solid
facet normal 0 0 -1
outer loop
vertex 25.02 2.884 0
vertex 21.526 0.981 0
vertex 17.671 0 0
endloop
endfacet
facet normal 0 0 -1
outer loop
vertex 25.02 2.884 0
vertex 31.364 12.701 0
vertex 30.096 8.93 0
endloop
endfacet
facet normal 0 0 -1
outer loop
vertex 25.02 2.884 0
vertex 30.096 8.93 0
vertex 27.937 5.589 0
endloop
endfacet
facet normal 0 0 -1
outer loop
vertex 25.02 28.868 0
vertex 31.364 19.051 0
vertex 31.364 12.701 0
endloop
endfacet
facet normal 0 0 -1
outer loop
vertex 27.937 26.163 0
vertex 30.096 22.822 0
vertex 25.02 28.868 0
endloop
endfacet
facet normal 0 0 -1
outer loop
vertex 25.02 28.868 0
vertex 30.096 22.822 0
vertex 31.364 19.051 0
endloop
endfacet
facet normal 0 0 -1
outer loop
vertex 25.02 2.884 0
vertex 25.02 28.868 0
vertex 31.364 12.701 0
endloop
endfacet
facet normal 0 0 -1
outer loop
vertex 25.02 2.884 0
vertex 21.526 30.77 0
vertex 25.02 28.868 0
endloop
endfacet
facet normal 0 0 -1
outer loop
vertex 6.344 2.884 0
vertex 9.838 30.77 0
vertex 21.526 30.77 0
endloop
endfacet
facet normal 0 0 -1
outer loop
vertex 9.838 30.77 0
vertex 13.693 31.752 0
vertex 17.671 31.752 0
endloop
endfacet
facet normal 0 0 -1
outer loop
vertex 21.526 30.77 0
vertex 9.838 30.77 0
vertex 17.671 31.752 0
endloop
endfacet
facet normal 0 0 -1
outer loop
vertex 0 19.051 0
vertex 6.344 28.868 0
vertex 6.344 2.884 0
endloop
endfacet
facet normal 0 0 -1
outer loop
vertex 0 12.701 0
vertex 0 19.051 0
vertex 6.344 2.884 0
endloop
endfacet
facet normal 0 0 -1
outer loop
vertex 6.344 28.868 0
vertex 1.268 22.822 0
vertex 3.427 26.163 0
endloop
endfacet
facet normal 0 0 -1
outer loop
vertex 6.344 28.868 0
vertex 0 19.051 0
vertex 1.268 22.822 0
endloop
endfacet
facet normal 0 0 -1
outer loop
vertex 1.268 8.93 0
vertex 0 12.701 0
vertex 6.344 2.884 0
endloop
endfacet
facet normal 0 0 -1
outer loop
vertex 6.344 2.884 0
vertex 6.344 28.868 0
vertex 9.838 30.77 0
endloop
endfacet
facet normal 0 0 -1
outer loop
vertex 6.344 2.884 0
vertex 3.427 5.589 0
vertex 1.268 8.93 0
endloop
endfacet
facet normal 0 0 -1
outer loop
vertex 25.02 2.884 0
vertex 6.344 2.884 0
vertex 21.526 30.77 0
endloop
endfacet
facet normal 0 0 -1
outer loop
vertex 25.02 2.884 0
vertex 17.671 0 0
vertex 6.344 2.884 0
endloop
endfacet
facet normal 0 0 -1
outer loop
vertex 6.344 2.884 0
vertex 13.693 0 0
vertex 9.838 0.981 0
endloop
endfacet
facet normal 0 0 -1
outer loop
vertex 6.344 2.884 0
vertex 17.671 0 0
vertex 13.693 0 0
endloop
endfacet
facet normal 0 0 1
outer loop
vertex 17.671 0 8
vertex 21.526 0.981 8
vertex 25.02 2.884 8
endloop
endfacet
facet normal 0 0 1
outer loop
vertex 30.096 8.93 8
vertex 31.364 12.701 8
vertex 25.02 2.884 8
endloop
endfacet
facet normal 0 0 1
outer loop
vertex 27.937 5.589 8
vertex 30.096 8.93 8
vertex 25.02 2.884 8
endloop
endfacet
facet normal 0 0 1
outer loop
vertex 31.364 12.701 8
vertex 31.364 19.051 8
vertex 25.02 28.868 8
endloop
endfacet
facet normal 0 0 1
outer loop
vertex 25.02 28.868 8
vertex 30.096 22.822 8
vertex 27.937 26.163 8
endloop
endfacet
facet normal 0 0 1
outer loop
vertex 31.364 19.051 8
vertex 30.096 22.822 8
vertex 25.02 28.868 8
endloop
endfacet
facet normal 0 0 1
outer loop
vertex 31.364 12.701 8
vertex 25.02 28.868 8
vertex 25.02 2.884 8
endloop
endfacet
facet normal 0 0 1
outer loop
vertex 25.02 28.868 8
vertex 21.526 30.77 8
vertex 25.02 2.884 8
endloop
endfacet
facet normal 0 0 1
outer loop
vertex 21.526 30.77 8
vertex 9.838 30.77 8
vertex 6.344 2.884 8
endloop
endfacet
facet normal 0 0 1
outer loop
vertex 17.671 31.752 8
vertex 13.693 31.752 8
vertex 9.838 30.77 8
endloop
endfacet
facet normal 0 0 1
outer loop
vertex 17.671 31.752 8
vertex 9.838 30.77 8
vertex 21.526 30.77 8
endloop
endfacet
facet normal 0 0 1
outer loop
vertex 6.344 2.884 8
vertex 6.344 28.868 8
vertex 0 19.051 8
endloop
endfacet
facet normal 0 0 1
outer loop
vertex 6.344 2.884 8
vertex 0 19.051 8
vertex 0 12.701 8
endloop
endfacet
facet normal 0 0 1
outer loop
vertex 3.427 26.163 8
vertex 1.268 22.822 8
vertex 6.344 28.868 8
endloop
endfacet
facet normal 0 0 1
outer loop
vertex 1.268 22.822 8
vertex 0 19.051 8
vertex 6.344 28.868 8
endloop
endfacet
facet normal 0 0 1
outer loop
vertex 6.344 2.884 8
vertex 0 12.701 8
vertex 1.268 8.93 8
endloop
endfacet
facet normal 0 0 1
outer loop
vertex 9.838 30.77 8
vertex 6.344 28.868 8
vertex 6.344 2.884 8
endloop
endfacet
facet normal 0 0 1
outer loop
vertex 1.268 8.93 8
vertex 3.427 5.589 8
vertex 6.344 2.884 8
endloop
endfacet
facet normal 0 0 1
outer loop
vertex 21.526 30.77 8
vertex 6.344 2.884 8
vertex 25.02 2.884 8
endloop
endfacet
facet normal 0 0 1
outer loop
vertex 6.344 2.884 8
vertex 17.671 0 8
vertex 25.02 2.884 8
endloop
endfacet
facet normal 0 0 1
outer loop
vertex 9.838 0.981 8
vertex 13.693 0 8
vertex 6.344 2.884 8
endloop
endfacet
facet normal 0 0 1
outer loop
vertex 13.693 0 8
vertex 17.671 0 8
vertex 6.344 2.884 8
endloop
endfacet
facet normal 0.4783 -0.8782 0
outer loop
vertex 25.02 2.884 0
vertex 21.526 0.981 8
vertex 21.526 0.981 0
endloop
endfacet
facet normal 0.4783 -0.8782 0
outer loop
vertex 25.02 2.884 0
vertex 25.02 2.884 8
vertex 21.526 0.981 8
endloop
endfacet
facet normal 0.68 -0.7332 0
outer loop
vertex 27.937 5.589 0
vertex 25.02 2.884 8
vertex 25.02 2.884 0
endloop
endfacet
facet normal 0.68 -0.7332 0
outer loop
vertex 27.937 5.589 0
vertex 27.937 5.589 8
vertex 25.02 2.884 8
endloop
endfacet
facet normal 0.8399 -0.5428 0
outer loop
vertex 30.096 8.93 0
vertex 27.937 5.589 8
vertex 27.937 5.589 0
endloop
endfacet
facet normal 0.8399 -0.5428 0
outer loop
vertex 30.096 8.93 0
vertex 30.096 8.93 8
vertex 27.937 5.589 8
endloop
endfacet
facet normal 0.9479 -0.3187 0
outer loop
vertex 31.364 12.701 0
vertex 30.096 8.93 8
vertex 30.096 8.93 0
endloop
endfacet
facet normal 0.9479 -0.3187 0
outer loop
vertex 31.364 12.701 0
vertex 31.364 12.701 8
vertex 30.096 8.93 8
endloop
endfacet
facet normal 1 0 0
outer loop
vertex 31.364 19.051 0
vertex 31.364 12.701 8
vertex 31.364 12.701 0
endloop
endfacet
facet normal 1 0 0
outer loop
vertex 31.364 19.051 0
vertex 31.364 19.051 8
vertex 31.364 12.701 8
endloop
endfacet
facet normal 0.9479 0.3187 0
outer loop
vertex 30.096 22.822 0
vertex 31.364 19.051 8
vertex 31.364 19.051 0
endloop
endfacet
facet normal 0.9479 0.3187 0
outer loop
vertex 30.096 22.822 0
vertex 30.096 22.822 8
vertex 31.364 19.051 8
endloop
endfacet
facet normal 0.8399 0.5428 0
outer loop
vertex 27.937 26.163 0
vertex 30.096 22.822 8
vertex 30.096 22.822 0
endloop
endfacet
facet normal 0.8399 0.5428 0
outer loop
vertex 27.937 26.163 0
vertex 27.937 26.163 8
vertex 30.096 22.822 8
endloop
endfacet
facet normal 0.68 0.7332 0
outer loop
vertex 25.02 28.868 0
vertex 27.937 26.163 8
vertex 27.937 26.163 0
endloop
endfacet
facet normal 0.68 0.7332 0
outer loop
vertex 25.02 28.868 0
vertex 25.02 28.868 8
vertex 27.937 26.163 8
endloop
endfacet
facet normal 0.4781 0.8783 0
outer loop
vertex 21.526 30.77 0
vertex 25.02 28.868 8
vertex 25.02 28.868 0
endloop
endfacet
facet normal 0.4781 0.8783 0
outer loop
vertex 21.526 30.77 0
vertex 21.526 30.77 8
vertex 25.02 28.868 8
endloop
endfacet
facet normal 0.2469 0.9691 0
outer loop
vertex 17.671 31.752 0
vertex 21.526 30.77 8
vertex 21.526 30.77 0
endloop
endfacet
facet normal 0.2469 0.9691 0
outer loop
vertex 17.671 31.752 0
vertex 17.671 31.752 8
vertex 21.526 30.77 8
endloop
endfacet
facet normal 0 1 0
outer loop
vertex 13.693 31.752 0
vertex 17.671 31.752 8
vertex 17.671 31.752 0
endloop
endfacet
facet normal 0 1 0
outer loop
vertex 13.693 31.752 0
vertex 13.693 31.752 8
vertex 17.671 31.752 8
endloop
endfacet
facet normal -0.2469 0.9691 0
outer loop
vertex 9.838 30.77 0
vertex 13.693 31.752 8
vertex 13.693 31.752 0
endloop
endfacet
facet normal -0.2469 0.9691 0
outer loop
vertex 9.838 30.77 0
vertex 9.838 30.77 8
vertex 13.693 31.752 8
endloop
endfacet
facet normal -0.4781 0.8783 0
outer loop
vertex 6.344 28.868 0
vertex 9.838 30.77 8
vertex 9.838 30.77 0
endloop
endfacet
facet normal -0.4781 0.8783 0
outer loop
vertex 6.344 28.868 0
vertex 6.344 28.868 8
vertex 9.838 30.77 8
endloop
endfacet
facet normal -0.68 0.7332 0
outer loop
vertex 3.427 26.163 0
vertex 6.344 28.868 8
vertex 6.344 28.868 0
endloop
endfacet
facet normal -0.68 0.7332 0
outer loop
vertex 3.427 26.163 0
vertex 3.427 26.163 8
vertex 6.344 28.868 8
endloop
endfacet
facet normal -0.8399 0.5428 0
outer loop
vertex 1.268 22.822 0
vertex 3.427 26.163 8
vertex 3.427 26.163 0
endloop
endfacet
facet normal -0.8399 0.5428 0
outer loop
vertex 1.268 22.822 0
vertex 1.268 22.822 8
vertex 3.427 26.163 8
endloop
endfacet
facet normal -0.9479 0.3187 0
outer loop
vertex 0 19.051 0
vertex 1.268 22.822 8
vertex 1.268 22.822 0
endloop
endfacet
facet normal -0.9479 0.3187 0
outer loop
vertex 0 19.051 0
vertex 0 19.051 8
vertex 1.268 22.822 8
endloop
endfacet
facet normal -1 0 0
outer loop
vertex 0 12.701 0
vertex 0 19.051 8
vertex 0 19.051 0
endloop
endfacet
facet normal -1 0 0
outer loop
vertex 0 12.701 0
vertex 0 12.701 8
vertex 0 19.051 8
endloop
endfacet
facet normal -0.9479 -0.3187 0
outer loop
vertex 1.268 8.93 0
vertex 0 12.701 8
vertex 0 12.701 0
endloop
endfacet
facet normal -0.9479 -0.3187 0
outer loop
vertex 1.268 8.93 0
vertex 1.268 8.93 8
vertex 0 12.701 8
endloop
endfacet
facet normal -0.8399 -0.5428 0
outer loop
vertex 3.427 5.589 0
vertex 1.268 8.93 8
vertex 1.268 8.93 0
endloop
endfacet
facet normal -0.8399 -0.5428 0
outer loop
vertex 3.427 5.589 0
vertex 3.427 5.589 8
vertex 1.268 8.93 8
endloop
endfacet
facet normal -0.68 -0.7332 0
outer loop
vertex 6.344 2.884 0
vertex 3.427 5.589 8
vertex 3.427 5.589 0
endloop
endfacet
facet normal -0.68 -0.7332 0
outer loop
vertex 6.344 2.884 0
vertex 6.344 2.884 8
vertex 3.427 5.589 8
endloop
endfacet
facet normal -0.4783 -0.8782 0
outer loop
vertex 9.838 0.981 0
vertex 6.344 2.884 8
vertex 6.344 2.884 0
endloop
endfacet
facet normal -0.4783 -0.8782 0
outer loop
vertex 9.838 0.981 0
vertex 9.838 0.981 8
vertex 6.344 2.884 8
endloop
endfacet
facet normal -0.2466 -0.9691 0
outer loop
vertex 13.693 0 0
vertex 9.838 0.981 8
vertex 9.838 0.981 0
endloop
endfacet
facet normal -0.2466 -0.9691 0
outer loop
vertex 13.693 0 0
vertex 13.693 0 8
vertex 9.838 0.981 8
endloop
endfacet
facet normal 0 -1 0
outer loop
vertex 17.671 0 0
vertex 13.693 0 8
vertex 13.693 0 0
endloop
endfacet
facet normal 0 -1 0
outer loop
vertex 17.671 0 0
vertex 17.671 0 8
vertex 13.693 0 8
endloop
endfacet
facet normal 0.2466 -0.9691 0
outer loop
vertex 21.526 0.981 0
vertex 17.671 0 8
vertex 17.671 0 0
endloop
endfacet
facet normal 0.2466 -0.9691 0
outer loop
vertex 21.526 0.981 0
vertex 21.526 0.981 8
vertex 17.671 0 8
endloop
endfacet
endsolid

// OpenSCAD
$fn = 32;

// ----------------------------------------------------------------------
// Flat adaptor: double_d, 8 mm thick
// ----------------------------------------------------------------------

// --- parameters (mm) ---
profile_height = 8;       // extrusion height
profile_points = 24;      // points of the closed outline

profile = [[31.364, 19.051], [30.096, 22.822], [27.937, 26.163], [25.02, 28.868], [21.526, 30.77], [17.671, 31.752], [13.693, 31.752], [9.838, 30.77], [6.344, 28.868], [3.427, 26.163], [1.268, 22.822], [0, 19.051], [0, 12.701], [1.268, 8.93], [3.427, 5.589], [6.344, 2.884], [9.838, 0.981], [13.693, 0], [17.671, 0], [21.526, 0.981], [25.02, 2.884], [27.937, 5.589], [30.096, 8.93], [31.364, 12.701]];  // single closed polygon, 24 points, counter clockwise

// --- the one profile operation ---
linear_extrude(height = profile_height) polygon(points = profile);
